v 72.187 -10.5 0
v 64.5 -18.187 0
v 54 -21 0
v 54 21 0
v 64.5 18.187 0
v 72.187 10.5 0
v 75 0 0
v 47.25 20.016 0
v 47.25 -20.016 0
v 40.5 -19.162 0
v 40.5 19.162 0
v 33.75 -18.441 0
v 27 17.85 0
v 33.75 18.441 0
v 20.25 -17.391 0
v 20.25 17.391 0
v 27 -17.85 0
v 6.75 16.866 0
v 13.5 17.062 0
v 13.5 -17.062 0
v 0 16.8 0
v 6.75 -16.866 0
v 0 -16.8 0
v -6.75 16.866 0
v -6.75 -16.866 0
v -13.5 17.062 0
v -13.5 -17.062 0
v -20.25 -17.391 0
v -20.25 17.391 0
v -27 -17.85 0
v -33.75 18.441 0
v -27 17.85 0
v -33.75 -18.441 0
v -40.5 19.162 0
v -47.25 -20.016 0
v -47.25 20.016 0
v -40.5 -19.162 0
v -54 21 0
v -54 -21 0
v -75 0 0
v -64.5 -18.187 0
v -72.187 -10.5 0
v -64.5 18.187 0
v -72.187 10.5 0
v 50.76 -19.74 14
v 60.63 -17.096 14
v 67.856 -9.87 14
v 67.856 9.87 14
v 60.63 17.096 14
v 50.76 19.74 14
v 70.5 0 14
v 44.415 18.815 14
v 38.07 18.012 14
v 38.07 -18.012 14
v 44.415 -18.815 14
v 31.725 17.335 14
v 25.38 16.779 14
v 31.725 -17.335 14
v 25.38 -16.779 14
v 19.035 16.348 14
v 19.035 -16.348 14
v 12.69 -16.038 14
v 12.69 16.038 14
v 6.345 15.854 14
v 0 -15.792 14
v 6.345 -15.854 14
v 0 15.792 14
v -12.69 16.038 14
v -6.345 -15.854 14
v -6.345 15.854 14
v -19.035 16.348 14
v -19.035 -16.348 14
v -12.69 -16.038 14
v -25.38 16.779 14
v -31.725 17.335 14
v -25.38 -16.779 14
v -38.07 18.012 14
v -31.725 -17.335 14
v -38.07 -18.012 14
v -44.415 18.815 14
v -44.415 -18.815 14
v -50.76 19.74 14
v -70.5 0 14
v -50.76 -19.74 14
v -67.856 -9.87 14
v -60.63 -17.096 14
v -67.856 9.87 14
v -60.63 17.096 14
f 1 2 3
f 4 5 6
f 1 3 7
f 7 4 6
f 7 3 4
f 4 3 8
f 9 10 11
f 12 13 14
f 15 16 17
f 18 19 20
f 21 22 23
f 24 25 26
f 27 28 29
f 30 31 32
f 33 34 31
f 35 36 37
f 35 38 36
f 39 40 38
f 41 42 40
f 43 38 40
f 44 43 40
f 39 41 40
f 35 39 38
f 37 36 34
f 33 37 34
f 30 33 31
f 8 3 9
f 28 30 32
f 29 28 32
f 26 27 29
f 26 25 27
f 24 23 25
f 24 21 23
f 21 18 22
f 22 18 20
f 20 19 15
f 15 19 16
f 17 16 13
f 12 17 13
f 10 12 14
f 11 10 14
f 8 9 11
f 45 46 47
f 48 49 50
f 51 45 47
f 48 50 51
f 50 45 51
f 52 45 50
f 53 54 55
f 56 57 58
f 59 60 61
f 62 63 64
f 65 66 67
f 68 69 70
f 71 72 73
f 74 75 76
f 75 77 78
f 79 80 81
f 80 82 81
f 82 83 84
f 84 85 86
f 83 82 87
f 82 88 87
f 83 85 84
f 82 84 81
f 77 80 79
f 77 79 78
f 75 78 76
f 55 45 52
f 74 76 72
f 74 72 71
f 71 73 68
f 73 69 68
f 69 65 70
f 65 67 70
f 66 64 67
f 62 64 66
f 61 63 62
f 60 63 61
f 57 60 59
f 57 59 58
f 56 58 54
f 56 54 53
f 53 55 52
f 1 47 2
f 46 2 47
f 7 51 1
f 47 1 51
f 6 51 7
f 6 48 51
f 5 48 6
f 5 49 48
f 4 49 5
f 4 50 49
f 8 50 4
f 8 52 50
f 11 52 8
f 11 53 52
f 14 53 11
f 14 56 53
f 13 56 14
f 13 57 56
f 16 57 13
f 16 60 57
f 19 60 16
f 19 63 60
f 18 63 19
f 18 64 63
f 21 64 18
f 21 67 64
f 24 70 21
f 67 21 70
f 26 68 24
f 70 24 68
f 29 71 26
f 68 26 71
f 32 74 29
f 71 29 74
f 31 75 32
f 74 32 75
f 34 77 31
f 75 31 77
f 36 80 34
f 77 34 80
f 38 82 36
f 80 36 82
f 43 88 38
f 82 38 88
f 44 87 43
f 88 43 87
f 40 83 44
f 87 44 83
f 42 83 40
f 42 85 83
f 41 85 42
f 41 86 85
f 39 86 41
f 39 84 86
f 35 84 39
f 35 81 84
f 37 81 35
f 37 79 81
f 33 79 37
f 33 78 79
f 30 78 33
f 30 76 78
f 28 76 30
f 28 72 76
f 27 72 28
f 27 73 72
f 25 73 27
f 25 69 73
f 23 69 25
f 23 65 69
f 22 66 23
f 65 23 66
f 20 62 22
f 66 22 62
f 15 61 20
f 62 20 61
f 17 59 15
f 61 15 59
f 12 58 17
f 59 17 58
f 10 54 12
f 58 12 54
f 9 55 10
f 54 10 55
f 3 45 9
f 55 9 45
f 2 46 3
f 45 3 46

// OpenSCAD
$fn = 32;

// ----------------------------------------------------------------------
// Handle: 150 x 42 mm grip, 14 mm thick
// ----------------------------------------------------------------------

// --- parameters (mm) ---
length = 150;             // grip length
width = 42;               // grip width
thickness = 14;           // grip thickness
waist = 0.8;              // width factor at the middle
draft = 0.94;             // top face scale of the extrusion

/* ergonomic grip outline, closed spline-like polygon in the XY plane */
grip = [[-54, 21], [-47.25, 20.016], [-40.5, 19.162], [-33.75, 18.441], [-27, 17.85], [-20.25, 17.391], [-13.5, 17.062], [-6.75, 16.866], [0, 16.8], [6.75, 16.866], [13.5, 17.062], [20.25, 17.391], [27, 17.85], [33.75, 18.441], [40.5, 19.162], [47.25, 20.016], [54, 21], [64.5, 18.187], [72.187, 10.5], [75, 0], [72.187, -10.5], [64.5, -18.187], [54, -21], [54, -21], [47.25, -20.016], [40.5, -19.162], [33.75, -18.441], [27, -17.85], [20.25, -17.391], [13.5, -17.062], [6.75, -16.866], [0, -16.8], [-6.75, -16.866], [-13.5, -17.062], [-20.25, -17.391], [-27, -17.85], [-33.75, -18.441], [-40.5, -19.162], [-47.25, -20.016], [-54, -21], [-64.5, -18.187], [-72.187, -10.5], [-75, 0], [-72.187, 10.5], [-64.5, 18.187], [-54, 21]];

module grip_body() {
  linear_extrude(height = thickness, scale = draft) polygon(grip);
}

difference() {
  union() {
    grip_body();
  }
}
